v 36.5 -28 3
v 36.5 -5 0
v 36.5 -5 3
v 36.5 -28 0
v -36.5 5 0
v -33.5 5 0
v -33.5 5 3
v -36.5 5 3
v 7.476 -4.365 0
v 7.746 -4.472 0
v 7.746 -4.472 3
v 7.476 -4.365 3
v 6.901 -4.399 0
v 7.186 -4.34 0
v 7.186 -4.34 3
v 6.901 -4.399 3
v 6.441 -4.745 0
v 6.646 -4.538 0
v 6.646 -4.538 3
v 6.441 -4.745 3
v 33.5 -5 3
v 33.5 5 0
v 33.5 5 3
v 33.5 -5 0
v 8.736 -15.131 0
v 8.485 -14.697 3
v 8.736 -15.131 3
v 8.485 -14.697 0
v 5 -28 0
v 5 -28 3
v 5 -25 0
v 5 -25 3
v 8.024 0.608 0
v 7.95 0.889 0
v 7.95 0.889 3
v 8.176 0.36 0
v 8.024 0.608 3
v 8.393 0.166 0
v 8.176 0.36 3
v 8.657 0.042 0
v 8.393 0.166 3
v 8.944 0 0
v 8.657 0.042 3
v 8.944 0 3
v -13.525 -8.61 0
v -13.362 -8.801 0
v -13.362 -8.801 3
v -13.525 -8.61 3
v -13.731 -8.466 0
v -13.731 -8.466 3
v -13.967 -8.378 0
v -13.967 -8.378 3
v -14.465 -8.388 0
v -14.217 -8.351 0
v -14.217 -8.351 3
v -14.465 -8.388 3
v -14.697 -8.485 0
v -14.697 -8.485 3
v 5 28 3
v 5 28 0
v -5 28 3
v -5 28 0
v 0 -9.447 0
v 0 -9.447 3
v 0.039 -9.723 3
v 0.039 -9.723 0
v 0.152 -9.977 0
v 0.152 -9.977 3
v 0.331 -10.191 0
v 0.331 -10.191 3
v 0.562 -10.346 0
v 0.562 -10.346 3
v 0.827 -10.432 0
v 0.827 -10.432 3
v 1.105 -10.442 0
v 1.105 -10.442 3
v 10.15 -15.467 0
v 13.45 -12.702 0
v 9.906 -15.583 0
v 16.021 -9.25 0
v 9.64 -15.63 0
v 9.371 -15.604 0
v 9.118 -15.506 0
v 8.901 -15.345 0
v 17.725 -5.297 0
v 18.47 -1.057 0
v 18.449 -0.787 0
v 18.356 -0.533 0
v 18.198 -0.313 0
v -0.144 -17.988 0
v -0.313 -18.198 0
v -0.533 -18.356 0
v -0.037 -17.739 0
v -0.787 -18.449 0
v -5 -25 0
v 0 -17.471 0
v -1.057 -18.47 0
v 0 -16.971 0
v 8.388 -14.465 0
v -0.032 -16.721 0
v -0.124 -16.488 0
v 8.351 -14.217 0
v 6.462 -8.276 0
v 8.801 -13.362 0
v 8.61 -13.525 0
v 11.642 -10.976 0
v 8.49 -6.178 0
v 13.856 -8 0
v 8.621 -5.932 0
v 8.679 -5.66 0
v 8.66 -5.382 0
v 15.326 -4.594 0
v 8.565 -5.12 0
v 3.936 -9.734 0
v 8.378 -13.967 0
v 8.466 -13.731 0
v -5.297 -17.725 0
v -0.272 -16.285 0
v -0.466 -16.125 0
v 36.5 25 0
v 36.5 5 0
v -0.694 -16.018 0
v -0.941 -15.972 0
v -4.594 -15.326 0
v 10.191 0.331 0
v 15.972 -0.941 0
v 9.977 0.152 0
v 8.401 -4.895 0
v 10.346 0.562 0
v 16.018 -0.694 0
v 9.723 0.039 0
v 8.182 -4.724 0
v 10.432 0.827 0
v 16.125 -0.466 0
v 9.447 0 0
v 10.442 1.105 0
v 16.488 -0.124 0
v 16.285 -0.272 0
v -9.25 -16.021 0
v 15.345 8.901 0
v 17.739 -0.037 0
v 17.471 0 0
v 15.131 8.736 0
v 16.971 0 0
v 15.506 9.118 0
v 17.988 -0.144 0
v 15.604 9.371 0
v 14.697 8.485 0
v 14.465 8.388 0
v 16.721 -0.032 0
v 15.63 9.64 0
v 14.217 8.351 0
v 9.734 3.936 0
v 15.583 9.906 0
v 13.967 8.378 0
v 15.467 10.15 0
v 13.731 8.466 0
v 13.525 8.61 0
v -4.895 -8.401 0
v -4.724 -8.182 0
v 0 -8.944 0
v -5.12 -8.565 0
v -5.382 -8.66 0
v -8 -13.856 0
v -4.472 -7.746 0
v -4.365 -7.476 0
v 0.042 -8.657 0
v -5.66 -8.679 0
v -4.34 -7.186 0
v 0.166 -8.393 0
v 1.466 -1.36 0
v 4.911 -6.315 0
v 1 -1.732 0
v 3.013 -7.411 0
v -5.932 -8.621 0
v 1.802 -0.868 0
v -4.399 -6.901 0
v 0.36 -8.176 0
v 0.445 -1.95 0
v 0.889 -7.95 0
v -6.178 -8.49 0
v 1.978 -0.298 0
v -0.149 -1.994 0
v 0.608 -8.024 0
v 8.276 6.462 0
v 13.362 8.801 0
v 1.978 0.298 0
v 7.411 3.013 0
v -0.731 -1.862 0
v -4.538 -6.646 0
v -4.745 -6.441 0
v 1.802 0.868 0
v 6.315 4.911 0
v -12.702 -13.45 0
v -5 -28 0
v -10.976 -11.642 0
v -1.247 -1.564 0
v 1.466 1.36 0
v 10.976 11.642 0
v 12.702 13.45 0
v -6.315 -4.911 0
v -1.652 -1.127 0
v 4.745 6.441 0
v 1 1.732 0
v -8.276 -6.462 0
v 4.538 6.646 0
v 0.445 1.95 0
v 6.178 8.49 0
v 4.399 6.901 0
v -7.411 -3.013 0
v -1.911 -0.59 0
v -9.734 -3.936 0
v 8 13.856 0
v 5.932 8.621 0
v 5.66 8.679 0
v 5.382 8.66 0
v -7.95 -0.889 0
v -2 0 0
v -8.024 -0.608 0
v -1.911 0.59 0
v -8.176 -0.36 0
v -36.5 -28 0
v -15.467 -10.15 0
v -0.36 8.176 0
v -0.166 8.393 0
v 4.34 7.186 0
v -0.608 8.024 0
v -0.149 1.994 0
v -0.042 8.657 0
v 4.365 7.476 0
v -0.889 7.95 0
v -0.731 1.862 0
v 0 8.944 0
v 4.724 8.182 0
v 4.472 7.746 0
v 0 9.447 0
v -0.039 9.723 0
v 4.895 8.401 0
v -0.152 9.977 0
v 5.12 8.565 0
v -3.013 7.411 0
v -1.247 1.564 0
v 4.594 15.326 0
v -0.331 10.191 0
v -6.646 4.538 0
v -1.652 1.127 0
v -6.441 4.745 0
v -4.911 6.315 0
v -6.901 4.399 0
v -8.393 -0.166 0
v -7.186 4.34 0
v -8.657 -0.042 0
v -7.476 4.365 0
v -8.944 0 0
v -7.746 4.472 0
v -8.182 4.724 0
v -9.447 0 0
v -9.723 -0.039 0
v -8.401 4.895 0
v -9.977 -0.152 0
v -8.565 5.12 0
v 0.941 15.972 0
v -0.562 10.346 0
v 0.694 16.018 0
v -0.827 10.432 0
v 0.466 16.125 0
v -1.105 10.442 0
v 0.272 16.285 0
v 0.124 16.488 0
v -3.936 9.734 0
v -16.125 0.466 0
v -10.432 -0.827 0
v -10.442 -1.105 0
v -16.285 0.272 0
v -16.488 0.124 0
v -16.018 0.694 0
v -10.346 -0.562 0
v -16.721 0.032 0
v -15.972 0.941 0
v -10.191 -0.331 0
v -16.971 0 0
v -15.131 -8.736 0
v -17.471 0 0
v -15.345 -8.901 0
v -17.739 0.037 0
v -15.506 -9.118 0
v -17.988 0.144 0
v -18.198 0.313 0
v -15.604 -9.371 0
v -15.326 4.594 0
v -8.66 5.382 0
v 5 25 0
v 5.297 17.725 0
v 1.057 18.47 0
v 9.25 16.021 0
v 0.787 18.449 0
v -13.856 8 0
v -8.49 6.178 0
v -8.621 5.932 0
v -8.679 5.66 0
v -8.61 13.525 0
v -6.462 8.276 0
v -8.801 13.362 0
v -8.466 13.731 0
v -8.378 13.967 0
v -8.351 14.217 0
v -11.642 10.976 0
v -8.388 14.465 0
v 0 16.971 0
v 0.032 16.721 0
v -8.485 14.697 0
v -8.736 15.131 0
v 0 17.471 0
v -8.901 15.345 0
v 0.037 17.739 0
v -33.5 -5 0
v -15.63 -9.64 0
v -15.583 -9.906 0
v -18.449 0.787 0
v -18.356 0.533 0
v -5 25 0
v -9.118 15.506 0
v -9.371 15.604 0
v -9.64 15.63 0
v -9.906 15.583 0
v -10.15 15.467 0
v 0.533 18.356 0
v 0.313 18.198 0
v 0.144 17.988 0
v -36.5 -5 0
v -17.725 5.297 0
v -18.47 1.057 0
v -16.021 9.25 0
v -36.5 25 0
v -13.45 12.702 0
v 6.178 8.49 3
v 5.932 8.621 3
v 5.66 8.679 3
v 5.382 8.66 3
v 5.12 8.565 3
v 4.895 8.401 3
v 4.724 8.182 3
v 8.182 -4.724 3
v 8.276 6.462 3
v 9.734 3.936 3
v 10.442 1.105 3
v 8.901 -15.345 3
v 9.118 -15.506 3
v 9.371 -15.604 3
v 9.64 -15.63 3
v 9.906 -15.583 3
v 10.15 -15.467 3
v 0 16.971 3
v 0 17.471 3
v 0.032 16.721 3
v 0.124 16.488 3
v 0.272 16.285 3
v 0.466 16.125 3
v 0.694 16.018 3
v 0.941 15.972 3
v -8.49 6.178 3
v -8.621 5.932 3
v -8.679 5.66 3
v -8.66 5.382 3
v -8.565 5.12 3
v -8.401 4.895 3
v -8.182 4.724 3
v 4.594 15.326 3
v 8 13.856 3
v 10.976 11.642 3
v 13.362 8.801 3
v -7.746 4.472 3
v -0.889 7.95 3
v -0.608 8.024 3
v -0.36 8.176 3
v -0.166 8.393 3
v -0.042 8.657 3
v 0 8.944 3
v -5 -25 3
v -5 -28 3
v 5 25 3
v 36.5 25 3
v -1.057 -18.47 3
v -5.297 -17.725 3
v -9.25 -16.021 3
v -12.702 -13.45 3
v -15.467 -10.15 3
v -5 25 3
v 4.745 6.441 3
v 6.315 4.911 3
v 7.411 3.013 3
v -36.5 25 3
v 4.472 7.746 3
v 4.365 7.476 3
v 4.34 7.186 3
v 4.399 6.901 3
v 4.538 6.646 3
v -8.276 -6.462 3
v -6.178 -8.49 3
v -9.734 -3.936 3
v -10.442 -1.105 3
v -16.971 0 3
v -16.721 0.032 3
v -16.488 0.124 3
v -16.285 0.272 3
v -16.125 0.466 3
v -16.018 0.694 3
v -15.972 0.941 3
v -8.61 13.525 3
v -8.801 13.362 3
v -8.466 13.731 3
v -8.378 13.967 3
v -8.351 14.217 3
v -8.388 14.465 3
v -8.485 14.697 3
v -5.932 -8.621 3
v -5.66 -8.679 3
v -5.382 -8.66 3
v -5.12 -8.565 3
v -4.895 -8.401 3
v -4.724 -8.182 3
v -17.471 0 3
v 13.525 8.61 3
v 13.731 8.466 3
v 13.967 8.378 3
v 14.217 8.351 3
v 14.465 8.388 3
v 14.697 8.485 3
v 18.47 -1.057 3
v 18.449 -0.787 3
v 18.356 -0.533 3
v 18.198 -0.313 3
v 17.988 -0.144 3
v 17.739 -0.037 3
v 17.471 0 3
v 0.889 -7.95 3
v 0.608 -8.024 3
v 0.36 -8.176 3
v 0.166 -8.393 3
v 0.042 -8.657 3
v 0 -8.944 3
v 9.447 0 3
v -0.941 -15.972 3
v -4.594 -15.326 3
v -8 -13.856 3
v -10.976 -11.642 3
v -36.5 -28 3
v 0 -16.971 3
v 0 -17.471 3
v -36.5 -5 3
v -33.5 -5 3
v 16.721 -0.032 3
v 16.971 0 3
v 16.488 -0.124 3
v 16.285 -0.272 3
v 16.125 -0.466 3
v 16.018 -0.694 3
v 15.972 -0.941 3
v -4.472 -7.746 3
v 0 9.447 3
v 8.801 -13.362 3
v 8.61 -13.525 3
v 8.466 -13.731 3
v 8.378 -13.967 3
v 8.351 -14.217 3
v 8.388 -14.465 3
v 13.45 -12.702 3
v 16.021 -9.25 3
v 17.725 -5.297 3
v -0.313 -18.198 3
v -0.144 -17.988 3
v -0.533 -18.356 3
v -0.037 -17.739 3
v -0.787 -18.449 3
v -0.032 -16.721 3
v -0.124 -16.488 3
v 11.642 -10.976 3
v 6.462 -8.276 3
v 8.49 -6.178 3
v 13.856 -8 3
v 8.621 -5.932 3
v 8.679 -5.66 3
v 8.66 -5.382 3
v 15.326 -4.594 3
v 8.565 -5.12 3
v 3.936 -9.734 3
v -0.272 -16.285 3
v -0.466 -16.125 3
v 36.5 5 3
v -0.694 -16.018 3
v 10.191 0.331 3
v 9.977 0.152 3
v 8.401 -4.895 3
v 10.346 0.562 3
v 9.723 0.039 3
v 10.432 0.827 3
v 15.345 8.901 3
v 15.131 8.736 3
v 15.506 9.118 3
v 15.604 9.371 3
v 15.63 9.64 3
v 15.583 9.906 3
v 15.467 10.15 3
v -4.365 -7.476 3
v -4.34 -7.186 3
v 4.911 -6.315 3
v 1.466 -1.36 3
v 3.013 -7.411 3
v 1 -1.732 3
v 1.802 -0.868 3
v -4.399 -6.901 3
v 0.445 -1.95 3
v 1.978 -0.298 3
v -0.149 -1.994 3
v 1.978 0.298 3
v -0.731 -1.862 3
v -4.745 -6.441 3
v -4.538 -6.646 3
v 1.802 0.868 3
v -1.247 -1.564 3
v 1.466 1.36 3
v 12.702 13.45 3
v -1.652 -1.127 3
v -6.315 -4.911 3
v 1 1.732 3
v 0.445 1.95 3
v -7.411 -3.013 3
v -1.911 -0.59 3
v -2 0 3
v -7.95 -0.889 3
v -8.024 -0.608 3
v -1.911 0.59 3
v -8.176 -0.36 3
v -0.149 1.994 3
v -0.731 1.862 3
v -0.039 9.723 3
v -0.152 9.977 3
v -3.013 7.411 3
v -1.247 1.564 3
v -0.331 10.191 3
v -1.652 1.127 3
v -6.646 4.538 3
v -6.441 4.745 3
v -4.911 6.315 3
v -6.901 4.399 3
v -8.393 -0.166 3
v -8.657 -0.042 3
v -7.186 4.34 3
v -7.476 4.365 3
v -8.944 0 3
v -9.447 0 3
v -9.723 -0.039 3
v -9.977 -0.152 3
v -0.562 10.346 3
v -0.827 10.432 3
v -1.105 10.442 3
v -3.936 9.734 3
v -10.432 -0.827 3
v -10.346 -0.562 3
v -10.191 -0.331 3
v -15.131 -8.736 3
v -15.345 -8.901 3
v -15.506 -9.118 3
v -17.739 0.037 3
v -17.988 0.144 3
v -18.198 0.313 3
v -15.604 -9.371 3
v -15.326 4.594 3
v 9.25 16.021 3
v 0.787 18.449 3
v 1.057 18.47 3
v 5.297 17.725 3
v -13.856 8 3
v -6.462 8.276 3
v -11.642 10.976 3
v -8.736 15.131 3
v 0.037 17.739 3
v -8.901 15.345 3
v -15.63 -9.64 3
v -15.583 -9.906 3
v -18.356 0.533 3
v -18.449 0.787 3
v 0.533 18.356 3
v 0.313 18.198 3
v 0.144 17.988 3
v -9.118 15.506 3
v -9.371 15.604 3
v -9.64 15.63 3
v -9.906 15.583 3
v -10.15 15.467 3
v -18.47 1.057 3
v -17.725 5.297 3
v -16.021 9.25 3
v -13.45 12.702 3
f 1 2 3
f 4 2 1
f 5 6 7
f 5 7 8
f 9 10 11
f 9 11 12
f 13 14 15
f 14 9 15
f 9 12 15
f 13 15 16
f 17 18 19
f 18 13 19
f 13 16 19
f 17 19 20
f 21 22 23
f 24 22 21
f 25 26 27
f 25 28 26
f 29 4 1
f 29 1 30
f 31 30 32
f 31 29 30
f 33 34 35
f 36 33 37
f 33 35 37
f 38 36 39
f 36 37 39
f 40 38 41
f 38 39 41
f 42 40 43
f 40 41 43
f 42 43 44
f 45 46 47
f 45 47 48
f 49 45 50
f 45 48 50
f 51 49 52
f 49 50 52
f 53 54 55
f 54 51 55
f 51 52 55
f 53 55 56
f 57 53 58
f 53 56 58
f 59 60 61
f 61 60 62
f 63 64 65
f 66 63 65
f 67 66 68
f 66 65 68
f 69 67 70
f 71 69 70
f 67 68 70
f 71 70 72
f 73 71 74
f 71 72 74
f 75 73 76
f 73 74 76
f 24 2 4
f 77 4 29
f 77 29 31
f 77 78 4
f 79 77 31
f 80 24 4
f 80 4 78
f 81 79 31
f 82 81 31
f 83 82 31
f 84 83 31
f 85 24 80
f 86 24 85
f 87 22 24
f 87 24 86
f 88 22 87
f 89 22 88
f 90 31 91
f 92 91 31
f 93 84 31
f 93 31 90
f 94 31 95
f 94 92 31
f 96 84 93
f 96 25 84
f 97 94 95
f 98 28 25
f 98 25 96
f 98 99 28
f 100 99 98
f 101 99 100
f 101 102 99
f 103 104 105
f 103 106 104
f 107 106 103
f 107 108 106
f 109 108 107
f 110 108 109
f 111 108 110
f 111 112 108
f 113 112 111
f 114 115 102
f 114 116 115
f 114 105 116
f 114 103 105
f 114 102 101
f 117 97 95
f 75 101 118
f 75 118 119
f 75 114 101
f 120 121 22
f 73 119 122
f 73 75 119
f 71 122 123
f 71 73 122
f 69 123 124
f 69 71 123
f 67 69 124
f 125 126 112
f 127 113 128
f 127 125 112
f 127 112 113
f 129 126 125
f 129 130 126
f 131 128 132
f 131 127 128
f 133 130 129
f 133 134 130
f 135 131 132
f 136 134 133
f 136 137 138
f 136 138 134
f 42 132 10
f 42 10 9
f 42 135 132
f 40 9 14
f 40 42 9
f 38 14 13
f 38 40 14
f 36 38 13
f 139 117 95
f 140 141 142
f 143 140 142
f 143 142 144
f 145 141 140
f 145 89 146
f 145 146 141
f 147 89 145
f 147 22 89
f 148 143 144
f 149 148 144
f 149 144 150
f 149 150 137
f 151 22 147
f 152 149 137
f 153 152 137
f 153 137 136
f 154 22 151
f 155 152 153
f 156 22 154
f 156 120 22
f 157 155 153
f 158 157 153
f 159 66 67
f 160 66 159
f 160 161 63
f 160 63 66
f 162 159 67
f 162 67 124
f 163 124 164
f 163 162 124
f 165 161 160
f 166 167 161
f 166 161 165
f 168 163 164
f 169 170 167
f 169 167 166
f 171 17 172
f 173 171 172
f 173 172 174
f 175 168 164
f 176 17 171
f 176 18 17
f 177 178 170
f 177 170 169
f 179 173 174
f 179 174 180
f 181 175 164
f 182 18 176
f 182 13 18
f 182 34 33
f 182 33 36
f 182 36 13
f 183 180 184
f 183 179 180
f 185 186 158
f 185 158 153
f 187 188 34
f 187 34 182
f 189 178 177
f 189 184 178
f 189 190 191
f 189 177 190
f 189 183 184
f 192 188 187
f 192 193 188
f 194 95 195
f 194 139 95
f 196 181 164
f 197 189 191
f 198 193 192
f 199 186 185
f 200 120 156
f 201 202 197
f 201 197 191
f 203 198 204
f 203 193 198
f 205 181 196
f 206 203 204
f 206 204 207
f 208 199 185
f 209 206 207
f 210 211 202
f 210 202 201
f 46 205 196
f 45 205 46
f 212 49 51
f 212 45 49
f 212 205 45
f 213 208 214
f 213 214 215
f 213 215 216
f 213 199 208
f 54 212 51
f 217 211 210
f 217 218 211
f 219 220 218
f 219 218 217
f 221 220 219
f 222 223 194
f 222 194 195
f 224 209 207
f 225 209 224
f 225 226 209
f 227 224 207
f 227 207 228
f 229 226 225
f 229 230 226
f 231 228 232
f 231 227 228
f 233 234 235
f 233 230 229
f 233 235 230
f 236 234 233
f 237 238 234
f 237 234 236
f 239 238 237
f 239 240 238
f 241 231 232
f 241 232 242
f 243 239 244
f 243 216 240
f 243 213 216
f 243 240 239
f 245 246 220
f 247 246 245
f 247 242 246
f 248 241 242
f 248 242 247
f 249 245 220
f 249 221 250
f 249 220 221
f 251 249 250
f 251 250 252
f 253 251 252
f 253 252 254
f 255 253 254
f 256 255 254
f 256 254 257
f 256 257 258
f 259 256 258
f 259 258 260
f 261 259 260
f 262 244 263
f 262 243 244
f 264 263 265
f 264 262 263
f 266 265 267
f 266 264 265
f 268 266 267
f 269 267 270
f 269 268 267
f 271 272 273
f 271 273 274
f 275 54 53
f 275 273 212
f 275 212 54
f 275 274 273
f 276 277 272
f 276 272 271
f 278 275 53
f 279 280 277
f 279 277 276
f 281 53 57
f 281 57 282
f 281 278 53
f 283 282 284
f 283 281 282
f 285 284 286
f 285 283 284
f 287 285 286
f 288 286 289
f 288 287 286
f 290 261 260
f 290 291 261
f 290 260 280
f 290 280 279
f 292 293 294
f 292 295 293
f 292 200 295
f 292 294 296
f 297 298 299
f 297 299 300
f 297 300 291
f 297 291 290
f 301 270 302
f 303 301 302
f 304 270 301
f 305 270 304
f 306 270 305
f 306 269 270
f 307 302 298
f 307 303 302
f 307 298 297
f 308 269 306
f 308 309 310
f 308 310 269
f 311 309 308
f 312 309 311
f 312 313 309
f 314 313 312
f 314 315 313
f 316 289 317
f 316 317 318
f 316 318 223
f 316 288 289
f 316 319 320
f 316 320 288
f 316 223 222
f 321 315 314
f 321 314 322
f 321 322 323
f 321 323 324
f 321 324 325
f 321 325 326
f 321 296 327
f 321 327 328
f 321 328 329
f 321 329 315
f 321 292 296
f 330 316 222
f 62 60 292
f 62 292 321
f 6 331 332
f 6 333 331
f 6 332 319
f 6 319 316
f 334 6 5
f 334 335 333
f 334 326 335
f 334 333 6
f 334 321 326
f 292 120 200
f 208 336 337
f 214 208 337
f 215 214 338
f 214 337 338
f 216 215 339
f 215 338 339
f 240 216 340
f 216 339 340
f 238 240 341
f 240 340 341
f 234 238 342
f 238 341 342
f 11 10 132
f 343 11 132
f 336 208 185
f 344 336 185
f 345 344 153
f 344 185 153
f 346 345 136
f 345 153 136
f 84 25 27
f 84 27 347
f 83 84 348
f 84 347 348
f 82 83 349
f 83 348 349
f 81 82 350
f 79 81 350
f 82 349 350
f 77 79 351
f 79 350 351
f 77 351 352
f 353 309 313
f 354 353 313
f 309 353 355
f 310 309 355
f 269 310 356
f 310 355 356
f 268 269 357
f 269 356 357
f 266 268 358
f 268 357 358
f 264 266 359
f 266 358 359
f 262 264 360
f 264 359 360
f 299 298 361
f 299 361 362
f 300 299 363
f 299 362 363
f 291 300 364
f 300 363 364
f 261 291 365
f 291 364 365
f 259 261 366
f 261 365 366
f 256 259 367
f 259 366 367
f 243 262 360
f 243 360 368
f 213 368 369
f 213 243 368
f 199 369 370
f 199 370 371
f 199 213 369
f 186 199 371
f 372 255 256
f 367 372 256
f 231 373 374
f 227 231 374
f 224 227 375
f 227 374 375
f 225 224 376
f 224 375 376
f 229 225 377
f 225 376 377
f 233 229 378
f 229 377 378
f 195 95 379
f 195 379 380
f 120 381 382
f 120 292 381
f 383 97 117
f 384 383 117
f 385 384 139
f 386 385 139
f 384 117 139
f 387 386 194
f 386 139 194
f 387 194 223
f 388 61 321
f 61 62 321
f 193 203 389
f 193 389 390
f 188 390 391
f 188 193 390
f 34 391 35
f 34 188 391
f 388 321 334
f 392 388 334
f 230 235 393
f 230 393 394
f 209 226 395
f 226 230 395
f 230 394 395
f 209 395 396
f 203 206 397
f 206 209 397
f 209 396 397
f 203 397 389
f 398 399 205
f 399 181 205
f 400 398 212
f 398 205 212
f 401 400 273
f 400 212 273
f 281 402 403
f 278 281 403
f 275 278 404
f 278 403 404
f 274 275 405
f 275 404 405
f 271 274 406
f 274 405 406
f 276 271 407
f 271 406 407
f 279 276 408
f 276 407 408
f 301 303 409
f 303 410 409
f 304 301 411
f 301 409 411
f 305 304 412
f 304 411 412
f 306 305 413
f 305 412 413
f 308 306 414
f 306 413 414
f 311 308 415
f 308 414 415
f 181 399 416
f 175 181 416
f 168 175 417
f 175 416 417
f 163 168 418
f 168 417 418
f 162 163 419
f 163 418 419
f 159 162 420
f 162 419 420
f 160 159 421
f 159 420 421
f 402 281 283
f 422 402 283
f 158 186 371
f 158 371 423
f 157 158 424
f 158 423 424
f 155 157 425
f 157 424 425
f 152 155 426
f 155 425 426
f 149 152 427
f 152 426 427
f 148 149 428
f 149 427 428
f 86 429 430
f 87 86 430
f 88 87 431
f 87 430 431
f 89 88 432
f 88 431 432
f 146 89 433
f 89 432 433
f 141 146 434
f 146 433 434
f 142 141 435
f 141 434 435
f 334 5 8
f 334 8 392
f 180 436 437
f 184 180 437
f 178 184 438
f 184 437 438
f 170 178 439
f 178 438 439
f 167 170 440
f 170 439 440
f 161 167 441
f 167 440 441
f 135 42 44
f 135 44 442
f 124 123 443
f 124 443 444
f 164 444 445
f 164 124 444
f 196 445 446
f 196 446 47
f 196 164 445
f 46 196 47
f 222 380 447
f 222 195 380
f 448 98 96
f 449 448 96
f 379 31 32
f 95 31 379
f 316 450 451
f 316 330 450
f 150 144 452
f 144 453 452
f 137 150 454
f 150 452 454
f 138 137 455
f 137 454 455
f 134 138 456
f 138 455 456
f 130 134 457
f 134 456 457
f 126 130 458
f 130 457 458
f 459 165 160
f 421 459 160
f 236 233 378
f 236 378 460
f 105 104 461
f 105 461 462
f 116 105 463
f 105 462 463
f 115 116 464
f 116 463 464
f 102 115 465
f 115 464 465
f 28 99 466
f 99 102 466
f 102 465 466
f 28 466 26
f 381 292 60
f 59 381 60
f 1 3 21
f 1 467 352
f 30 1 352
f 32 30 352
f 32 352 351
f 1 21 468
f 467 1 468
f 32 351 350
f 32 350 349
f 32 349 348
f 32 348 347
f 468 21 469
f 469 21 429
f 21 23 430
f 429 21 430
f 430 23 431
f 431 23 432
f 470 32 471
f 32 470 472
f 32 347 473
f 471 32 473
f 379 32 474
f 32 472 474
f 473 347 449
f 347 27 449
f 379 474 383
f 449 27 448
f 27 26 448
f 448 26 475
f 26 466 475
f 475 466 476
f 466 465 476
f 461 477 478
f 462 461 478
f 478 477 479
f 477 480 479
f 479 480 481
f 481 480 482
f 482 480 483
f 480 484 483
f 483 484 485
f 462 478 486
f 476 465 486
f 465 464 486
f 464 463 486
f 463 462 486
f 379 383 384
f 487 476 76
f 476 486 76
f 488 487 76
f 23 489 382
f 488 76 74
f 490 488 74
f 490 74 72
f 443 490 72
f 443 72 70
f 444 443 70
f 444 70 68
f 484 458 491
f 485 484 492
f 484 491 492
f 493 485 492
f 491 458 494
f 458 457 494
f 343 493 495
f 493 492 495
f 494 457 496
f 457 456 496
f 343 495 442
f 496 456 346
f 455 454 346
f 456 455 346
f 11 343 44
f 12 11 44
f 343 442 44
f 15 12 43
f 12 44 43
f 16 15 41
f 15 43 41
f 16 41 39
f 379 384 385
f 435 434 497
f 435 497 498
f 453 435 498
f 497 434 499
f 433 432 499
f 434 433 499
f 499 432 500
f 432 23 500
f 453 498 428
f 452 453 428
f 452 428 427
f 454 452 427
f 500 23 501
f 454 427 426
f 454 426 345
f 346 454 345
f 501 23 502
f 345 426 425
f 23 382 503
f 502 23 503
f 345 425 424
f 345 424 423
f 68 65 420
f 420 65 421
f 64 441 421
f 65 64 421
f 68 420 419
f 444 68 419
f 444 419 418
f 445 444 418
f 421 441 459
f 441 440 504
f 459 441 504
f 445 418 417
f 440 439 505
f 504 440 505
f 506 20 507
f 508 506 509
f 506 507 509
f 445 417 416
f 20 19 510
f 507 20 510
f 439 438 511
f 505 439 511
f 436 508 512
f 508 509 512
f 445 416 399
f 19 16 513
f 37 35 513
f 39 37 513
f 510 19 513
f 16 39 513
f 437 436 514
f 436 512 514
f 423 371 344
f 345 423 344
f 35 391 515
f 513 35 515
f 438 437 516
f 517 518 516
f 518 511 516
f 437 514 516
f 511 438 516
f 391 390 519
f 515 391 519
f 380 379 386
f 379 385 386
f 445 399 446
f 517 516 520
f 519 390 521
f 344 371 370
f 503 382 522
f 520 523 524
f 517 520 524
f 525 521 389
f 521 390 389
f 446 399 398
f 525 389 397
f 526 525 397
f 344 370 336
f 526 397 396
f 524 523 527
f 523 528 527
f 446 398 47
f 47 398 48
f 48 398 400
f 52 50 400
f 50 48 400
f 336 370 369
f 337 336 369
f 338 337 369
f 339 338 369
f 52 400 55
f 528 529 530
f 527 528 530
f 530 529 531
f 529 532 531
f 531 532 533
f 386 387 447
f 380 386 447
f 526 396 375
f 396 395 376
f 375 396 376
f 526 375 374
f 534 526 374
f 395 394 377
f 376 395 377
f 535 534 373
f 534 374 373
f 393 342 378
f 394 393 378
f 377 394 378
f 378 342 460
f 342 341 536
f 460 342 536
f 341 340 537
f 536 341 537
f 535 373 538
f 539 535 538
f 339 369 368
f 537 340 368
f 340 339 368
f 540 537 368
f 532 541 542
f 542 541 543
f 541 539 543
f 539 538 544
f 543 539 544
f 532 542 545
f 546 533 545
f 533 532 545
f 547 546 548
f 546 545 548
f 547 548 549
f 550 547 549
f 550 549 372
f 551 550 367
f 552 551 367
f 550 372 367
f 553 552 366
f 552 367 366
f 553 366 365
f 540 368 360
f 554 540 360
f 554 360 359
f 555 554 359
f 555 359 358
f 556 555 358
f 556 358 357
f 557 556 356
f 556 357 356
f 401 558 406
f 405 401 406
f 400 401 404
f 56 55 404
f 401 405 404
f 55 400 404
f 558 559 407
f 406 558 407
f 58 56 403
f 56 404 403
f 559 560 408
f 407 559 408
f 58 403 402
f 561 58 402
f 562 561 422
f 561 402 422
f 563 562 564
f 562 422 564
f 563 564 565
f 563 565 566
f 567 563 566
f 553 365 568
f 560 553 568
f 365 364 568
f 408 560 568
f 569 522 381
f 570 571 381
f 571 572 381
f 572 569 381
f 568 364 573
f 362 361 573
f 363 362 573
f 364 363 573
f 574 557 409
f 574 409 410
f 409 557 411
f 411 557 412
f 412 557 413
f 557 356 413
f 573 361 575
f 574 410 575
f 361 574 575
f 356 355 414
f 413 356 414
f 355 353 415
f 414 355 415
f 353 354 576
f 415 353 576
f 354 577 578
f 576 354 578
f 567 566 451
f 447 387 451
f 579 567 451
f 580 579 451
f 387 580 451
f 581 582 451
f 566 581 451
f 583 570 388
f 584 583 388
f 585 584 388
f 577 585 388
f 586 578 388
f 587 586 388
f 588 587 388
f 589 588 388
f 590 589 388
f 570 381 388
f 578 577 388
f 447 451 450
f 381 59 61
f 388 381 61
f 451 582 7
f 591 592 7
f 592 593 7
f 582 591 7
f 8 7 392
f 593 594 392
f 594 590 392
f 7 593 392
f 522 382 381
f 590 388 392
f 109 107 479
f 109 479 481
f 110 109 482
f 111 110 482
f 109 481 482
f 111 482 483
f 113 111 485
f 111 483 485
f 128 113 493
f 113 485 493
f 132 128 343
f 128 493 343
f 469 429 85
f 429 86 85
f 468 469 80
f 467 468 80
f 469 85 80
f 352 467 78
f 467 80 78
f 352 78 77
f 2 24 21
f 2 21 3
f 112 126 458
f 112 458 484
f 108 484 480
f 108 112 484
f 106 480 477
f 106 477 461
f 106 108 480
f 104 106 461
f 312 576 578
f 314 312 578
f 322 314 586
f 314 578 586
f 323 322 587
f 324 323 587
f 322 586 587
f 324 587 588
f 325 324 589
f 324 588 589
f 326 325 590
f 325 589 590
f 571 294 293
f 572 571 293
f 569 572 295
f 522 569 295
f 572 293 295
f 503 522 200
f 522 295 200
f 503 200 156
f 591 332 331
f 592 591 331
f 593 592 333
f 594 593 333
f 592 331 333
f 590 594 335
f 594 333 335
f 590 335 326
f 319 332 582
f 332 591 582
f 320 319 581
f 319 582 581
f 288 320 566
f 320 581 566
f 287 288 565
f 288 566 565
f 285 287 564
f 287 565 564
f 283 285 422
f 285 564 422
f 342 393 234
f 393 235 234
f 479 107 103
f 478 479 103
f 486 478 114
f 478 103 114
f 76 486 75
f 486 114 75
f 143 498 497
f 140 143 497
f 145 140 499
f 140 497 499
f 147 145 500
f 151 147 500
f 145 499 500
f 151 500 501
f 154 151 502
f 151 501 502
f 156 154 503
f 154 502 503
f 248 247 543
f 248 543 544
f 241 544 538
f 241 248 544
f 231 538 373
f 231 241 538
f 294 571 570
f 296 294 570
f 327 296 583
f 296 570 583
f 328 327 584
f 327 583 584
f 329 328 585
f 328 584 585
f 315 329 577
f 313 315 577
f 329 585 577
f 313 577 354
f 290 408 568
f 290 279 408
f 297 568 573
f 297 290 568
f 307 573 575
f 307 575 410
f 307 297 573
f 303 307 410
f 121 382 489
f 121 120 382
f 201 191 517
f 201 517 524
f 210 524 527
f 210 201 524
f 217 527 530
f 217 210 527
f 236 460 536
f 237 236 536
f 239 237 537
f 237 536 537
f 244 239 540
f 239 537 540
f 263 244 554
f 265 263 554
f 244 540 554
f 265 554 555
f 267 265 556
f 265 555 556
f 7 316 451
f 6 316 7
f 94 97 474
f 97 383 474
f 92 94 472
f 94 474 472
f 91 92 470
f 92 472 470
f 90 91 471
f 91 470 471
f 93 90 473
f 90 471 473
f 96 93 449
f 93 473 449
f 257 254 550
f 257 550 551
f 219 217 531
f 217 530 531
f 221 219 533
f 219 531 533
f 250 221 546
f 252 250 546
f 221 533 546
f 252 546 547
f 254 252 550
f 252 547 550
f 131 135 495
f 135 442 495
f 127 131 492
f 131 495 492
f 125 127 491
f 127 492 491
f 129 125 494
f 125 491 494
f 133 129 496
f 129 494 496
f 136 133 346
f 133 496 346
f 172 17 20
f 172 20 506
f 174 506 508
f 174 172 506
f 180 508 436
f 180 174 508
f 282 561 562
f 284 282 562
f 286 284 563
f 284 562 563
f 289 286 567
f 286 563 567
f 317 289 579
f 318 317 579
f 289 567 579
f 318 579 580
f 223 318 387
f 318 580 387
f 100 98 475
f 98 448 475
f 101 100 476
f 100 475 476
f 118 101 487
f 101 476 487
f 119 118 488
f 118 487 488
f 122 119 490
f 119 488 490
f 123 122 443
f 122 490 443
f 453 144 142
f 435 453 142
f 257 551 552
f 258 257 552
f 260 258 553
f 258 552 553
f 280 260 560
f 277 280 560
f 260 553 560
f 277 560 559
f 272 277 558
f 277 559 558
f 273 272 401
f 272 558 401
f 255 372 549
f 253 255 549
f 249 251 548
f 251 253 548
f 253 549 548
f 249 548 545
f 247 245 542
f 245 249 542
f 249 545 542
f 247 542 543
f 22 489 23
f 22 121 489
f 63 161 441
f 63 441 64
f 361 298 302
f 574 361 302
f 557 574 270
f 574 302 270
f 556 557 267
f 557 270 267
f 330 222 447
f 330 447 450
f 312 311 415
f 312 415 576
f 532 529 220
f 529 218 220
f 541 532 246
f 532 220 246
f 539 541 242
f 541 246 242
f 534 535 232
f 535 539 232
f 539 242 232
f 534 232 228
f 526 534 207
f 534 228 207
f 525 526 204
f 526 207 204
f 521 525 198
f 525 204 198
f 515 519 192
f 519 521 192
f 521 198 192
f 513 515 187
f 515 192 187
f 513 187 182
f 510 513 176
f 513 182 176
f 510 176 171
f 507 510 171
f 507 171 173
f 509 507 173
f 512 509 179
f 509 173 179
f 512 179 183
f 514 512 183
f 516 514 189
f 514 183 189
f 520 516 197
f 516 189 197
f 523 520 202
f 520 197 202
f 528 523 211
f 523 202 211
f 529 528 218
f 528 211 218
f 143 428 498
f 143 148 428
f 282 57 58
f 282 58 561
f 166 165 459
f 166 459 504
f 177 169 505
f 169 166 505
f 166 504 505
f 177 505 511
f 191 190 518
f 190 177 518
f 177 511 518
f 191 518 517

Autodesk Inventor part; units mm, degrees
ref_plane "YZ Plane" through (0, 0, 0) normal (1, 0, 0) x (0, 1, 0)
ref_plane "XZ Plane" through (0, 0, 0) normal (0, 1, 0) x (-1, 0, 0)
ref_plane "XY Plane" through (0, 0, 0) normal (0, 0, 1) x (1, 0, 0)
sketch "Sketch1" plane through (0, 0, 0) normal (0, 0, 1) x (1, 0, 0)
  line L0 (36.5, -28) -> (-36.5, -28)
  line L1 (-36.5, -28) -> (-36.5, 28)
  line L2 (-36.5, 28) -> (36.5, 28)
  line L3 (36.5, 28) -> (36.5, -28)
  line L4 (36.5, -28) -> (-36.5, 28) construction
  line L5 (-36.5, -28) -> (36.5, 28) construction
  point P0 (0, 0)
  dimension "d0" = 73
  dimension "d1" = 56
extrude "Extrusion1" add sketch "Sketch1" along normal blind 3
sketch "Sketch2" plane through (0, 0, 0) normal (0, 0, -1) x (-1, 0, 0)
  line L0 (36.5, -5) -> (33.5, -5)
  line L1 (33.5, -5) -> (33.5, 5)
  line L2 (33.5, 5) -> (36.5, 5)
  line L3 (36.5, 5) -> (36.5, -5)
  line L4 (36.5, -5) -> (33.5, 5) construction
  line L5 (33.5, -5) -> (36.5, 5) construction
  line L6 (36.5, 28) -> (36.5, -28) projected
  circle A0 centre (0, 0) radius 2
  circle A1 centre (0, 0) radius 8
  circle A2 centre (0, 0) radius 10.5
  circle A3 centre (0, 0) radius 16
  circle A4 centre (0, 0) radius 18.5
  line L7 (0, 0) -> (0, 10.5)
  line L8 (0, 0) -> (9.0933, 5.25)
  line L9 (0, 0) -> (0, 18.5)
  line L10 (0, 0) -> (-16.0215, 9.25)
  point P0 (35, 0)
  point P1 (36.5, 0)
  point P2 (-13.8564, 8)
  point P3 (0, 16)
  point P4 (6.9282, 4)
  point P5 (0, 8)
  dimension "d4" = 3
  dimension "d5" = 10
  dimension "d6" = 4
  dimension "d7" = 16
  dimension "d8" = 21
  dimension "d9" = 32
  dimension "d10" = 37
  dimension "d11" = 60
  dimension "d12" = 60
extrude "Extrusion3" cut sketch "Sketch2" against normal through all contours A0 L10 L8 | L8 L7 A0 | A0 L7 L10 | A1 L7 A2 L8 | L10 A4 L9 A3 picked at (-14.542, 9.8763)
fillet "Fillet1" radius 1 8 edges at (13.8564, 8, 1.5) (-6.9282, 4, 1.5) (0, 8, 1.5) (16.0215, 9.25, 1.5) (0, 10.5, 1.5) (-9.0933, 5.25, 1.5) (0, 16, 1.5) (0, 18.5, 1.5)
pattern_circular "Circular Pattern1" count 4 over 360 about axis through (0, 0, 0) along (0, 0, 1) of "Extrusion3", "Fillet1"
sketch "Sketch5" plane through (0, 0, 0) normal (0, 0, -1) x (-1, 0, 0)
  line L0 (5, 25) -> (-5, 25)
  line L1 (-5, 25) -> (-5, 28)
  line L2 (-5, 28) -> (5, 28)
  line L3 (5, 28) -> (5, 25)
  line L4 (5, 25) -> (-5, 28) construction
  line L5 (-5, 25) -> (5, 28) construction
  line L6 (36.5, 28) -> (36.5, -28) projected
  line L7 (-36.5, 28) -> (36.5, 28) projected
  line L8 (5, -28) -> (-5, -28)
  line L9 (-5, -28) -> (-5, -25)
  line L10 (-5, -25) -> (5, -25)
  line L11 (5, -25) -> (5, -28)
  line L12 (5, -28) -> (-5, -25) construction
  line L13 (-5, -28) -> (5, -25) construction
  line L14 (36.5, -28) -> (-36.5, -28) projected
  line L15 (-36.5, 5) -> (-33.5, 5)
  line L16 (-33.5, 5) -> (-33.5, -5)
  line L17 (-33.5, -5) -> (-36.5, -5)
  line L18 (-36.5, -5) -> (-36.5, 5)
  line L19 (-36.5, 5) -> (-33.5, -5) construction
  line L20 (-33.5, 5) -> (-36.5, -5) construction
  line L21 (-36.5, -28) -> (-36.5, 28) projected
  line L22 (33.5, 5) -> (36.5, 5)
  line L23 (36.5, 5) -> (36.5, -5)
  line L24 (36.5, -5) -> (33.5, -5)
  line L25 (33.5, -5) -> (33.5, 5)
  line L26 (33.5, 5) -> (36.5, -5) construction
  line L27 (36.5, 5) -> (33.5, -5) construction
  point P0 (0, 0)
  point P1 (0, 26.5)
  point P2 (0, 28)
  point P3 (0, -26.5)
  point P4 (0, -28)
  point P5 (-35, 0)
  point P6 (-36.5, 0)
  point P7 (35, 0)
  point P8 (36.5, 0)
  dimension "d31" = 10
  dimension "d32" = 3
  dimension "d33" = 36.5
  dimension "d34" = 10
  dimension "d35" = 3
  dimension "d36" = 3
  dimension "d37" = 10
  dimension "d38" = 3
  dimension "d39" = 10
extrude "Extrusion6" cut sketch "Sketch5" against normal through all contours L0 L1 L2 L3 | L6 L24 L25 L22 | L15 L16 L17 L18 | L8 L9 L10 L11
sketch "Sketch6" plane through (0, 0, 0) normal (0, 0, -1) x (-1, 0, 0)
  line L0 (-36.5, 28) -> (-5, 28) projected
  line L1 (5, 28) -> (36.5, 28) projected
  line L2 (5, 25) -> (-5, 25) projected
  line L3 (5, 28) -> (5, 25) projected
  line L4 (-5, 25) -> (-5, 28) projected
  line L5 (-5, 28) -> (5, 28)
  line L6 (-5, 25) -> (-36.5, 25)
  line L7 (-36.5, 5) -> (-36.5, 28) projected
  line L8 (5, 25) -> (36.5, 25)
  line L9 (36.5, 28) -> (36.5, 5) projected
  point P0 (0, 0)
extrude "Extrusion7" add sketch "Sketch6" against normal blind 3 contours L5 L3 L2 L4
extrude "Extrusion8" cut sketch "Sketch6" against normal through all contours L0 L4 L6 L7 | L1 L9 L8 L3
sketch "Sketch7" plane through (0, 0, 3) normal (0, 0, 1) x (1, 0, 0)
  line L0 (-5, -25) -> (-5, -28) projected
  line L1 (-5, -28) -> (-36.5, -28) projected
  line L2 (-36.5, -28) -> (-36.5, -5) projected
  line L3 (-36.5, -5) -> (-33.5, -5) projected
  line L4 (-33.5, -5) -> (-33.5, 5) projected
  line L5 (-33.5, 5) -> (-36.5, 5) projected
  line L6 (-36.5, 5) -> (-36.5, 25) projected
  line L7 (-36.5, 25) -> (-5, 25) projected
  line L8 (-5, 25) -> (-5, 28) projected
  line L9 (-5, 28) -> (5, 28) projected
  line L10 (5, 28) -> (5, 25) projected
  line L11 (5, 25) -> (36.5, 25) projected
  line L12 (36.5, 25) -> (36.5, 5) projected
  line L13 (36.5, 5) -> (33.5, 5) projected
  line L14 (33.5, 5) -> (33.5, -5) projected
  line L15 (33.5, -5) -> (36.5, -5) projected
  line L16 (36.5, -5) -> (36.5, -28) projected
  line L17 (36.5, -28) -> (5, -28) projected
  line L18 (5, -28) -> (5, -25) projected
  line L19 (5, -25) -> (-5, -25) projected
  arc A0 (16.9706, 0) -> (15.9723, -0.9412) centre (16.9706, -1) ccw projected
  arc A1 (8.8012, -13.3618) -> (15.9723, -0.9412) centre (0, 0) ccw projected
  arc A2 (8.8012, -13.3618) -> (8.4853, -14.6969) centre (9.3513, -14.1969) ccw projected
  line L20 (8.4853, -14.6969) -> (8.7357, -15.1307) projected
  arc A3 (8.7357, -15.1307) -> (10.1504, -15.4667) centre (9.6017, -14.6307) ccw projected
  arc A4 (10.1504, -15.4667) -> (18.4698, -1.0571) centre (0, 0) ccw projected
  arc A5 (18.4698, -1.0571) -> (17.4714, 0) centre (17.4714, -1) ccw projected
  line L21 (17.4714, 0) -> (16.9706, 0) projected
  arc A6 (6.178, 8.4901) -> (4.7236, 8.1815) centre (5.5896, 7.6815) ccw projected
  line L22 (4.7236, 8.1815) -> (4.4721, 7.746) projected
  arc A7 (4.4721, 7.746) -> (4.745, 6.4409) centre (5.3382, 7.246) ccw projected
  arc A8 (7.9505, 0.8889) -> (4.745, 6.4409) centre (0, 0) ccw projected
  arc A9 (7.9505, 0.8889) -> (8.9443, 0) centre (8.9443, 1) ccw projected
  line L23 (8.9443, 0) -> (9.4472, 0) projected
  arc A10 (9.4472, 0) -> (10.4417, 1.1053) centre (9.4472, 1) ccw projected
  arc A11 (10.4417, 1.1053) -> (6.178, 8.4901) centre (0, 0) ccw projected
  arc A12 (0, -16.9706) -> (-0.9412, -15.9723) centre (-1, -16.9706) ccw projected
  arc A13 (-13.3618, -8.8012) -> (-0.9412, -15.9723) centre (0, 0) ccw projected
  arc A14 (-13.3618, -8.8012) -> (-14.6969, -8.4853) centre (-14.1969, -9.3513) ccw projected
  line L24 (-14.6969, -8.4853) -> (-15.1307, -8.7357) projected
  arc A15 (-15.1307, -8.7357) -> (-15.4667, -10.1504) centre (-14.6307, -9.6017) ccw projected
  arc A16 (-15.4667, -10.1504) -> (-1.0571, -18.4698) centre (0, 0) ccw projected
  arc A17 (-1.0571, -18.4698) -> (0, -17.4714) centre (-1, -17.4714) ccw projected
  line L25 (0, -17.4714) -> (0, -16.9706) projected
  arc A18 (8.4901, -6.178) -> (8.1815, -4.7236) centre (7.6815, -5.5896) ccw projected
  line L26 (8.1815, -4.7236) -> (7.746, -4.4721) projected
  arc A19 (7.746, -4.4721) -> (6.4409, -4.745) centre (7.246, -5.3382) ccw projected
  arc A20 (0.8889, -7.9505) -> (6.4409, -4.745) centre (0, 0) ccw projected
  arc A21 (0.8889, -7.9505) -> (0, -8.9443) centre (1, -8.9443) ccw projected
  line L27 (0, -8.9443) -> (0, -9.4472) projected
  arc A22 (0, -9.4472) -> (1.1053, -10.4417) centre (1, -9.4472) ccw projected
  arc A23 (1.1053, -10.4417) -> (8.4901, -6.178) centre (0, 0) ccw projected
  arc A24 (-16.9706, 0) -> (-15.9723, 0.9412) centre (-16.9706, 1) ccw projected
  arc A25 (-8.8012, 13.3618) -> (-15.9723, 0.9412) centre (0, 0) ccw projected
  arc A26 (-8.8012, 13.3618) -> (-8.4853, 14.6969) centre (-9.3513, 14.1969) ccw projected
  line L28 (-8.4853, 14.6969) -> (-8.7357, 15.1307) projected
  arc A27 (-8.7357, 15.1307) -> (-10.1504, 15.4667) centre (-9.6017, 14.6307) ccw projected
  arc A28 (-10.1504, 15.4667) -> (-18.4698, 1.0571) centre (0, 0) ccw projected
  arc A29 (-18.4698, 1.0571) -> (-17.4714, 0) centre (-17.4714, 1) ccw projected
  line L29 (-17.4714, 0) -> (-16.9706, 0) projected
  arc A30 (-6.178, -8.4901) -> (-4.7236, -8.1815) centre (-5.5896, -7.6815) ccw projected
  line L30 (-4.7236, -8.1815) -> (-4.4721, -7.746) projected
  arc A31 (-4.4721, -7.746) -> (-4.745, -6.4409) centre (-5.3382, -7.246) ccw projected
  arc A32 (-7.9505, -0.8889) -> (-4.745, -6.4409) centre (0, 0) ccw projected
  arc A33 (-7.9505, -0.8889) -> (-8.9443, 0) centre (-8.9443, -1) ccw projected
  line L31 (-8.9443, 0) -> (-9.4472, 0) projected
  arc A34 (-9.4472, 0) -> (-10.4417, -1.1053) centre (-9.4472, -1) ccw projected
  arc A35 (-10.4417, -1.1053) -> (-6.178, -8.4901) centre (0, 0) ccw projected
  arc A36 (0, 16.9706) -> (0.9412, 15.9723) centre (1, 16.9706) ccw projected
  arc A37 (13.3618, 8.8012) -> (0.9412, 15.9723) centre (0, 0) ccw projected
  arc A38 (13.3618, 8.8012) -> (14.6969, 8.4853) centre (14.1969, 9.3513) ccw projected
  line L32 (14.6969, 8.4853) -> (15.1307, 8.7357) projected
  arc A39 (15.1307, 8.7357) -> (15.4667, 10.1504) centre (14.6307, 9.6017) ccw projected
  arc A40 (15.4667, 10.1504) -> (1.0571, 18.4698) centre (0, 0) ccw projected
  arc A41 (1.0571, 18.4698) -> (0, 17.4714) centre (1, 17.4714) ccw projected
  line L33 (0, 17.4714) -> (0, 16.9706) projected
  arc A42 (-8.4901, 6.178) -> (-8.1815, 4.7236) centre (-7.6815, 5.5896) ccw projected
  line L34 (-8.1815, 4.7236) -> (-7.746, 4.4721) projected
  arc A43 (-7.746, 4.4721) -> (-6.4409, 4.745) centre (-7.246, 5.3382) ccw projected
  arc A44 (-0.8889, 7.9505) -> (-6.4409, 4.745) centre (0, 0) ccw projected
  arc A45 (-0.8889, 7.9505) -> (0, 8.9443) centre (-1, 8.9443) ccw projected
  line L35 (0, 8.9443) -> (0, 9.4472) projected
  arc A46 (0, 9.4472) -> (-1.1053, 10.4417) centre (-1, 9.4472) ccw projected
  arc A47 (-1.1053, 10.4417) -> (-8.4901, 6.178) centre (0, 0) ccw projected
  circle A48 centre (0, 0) radius 2 projected
properties part number "right"
